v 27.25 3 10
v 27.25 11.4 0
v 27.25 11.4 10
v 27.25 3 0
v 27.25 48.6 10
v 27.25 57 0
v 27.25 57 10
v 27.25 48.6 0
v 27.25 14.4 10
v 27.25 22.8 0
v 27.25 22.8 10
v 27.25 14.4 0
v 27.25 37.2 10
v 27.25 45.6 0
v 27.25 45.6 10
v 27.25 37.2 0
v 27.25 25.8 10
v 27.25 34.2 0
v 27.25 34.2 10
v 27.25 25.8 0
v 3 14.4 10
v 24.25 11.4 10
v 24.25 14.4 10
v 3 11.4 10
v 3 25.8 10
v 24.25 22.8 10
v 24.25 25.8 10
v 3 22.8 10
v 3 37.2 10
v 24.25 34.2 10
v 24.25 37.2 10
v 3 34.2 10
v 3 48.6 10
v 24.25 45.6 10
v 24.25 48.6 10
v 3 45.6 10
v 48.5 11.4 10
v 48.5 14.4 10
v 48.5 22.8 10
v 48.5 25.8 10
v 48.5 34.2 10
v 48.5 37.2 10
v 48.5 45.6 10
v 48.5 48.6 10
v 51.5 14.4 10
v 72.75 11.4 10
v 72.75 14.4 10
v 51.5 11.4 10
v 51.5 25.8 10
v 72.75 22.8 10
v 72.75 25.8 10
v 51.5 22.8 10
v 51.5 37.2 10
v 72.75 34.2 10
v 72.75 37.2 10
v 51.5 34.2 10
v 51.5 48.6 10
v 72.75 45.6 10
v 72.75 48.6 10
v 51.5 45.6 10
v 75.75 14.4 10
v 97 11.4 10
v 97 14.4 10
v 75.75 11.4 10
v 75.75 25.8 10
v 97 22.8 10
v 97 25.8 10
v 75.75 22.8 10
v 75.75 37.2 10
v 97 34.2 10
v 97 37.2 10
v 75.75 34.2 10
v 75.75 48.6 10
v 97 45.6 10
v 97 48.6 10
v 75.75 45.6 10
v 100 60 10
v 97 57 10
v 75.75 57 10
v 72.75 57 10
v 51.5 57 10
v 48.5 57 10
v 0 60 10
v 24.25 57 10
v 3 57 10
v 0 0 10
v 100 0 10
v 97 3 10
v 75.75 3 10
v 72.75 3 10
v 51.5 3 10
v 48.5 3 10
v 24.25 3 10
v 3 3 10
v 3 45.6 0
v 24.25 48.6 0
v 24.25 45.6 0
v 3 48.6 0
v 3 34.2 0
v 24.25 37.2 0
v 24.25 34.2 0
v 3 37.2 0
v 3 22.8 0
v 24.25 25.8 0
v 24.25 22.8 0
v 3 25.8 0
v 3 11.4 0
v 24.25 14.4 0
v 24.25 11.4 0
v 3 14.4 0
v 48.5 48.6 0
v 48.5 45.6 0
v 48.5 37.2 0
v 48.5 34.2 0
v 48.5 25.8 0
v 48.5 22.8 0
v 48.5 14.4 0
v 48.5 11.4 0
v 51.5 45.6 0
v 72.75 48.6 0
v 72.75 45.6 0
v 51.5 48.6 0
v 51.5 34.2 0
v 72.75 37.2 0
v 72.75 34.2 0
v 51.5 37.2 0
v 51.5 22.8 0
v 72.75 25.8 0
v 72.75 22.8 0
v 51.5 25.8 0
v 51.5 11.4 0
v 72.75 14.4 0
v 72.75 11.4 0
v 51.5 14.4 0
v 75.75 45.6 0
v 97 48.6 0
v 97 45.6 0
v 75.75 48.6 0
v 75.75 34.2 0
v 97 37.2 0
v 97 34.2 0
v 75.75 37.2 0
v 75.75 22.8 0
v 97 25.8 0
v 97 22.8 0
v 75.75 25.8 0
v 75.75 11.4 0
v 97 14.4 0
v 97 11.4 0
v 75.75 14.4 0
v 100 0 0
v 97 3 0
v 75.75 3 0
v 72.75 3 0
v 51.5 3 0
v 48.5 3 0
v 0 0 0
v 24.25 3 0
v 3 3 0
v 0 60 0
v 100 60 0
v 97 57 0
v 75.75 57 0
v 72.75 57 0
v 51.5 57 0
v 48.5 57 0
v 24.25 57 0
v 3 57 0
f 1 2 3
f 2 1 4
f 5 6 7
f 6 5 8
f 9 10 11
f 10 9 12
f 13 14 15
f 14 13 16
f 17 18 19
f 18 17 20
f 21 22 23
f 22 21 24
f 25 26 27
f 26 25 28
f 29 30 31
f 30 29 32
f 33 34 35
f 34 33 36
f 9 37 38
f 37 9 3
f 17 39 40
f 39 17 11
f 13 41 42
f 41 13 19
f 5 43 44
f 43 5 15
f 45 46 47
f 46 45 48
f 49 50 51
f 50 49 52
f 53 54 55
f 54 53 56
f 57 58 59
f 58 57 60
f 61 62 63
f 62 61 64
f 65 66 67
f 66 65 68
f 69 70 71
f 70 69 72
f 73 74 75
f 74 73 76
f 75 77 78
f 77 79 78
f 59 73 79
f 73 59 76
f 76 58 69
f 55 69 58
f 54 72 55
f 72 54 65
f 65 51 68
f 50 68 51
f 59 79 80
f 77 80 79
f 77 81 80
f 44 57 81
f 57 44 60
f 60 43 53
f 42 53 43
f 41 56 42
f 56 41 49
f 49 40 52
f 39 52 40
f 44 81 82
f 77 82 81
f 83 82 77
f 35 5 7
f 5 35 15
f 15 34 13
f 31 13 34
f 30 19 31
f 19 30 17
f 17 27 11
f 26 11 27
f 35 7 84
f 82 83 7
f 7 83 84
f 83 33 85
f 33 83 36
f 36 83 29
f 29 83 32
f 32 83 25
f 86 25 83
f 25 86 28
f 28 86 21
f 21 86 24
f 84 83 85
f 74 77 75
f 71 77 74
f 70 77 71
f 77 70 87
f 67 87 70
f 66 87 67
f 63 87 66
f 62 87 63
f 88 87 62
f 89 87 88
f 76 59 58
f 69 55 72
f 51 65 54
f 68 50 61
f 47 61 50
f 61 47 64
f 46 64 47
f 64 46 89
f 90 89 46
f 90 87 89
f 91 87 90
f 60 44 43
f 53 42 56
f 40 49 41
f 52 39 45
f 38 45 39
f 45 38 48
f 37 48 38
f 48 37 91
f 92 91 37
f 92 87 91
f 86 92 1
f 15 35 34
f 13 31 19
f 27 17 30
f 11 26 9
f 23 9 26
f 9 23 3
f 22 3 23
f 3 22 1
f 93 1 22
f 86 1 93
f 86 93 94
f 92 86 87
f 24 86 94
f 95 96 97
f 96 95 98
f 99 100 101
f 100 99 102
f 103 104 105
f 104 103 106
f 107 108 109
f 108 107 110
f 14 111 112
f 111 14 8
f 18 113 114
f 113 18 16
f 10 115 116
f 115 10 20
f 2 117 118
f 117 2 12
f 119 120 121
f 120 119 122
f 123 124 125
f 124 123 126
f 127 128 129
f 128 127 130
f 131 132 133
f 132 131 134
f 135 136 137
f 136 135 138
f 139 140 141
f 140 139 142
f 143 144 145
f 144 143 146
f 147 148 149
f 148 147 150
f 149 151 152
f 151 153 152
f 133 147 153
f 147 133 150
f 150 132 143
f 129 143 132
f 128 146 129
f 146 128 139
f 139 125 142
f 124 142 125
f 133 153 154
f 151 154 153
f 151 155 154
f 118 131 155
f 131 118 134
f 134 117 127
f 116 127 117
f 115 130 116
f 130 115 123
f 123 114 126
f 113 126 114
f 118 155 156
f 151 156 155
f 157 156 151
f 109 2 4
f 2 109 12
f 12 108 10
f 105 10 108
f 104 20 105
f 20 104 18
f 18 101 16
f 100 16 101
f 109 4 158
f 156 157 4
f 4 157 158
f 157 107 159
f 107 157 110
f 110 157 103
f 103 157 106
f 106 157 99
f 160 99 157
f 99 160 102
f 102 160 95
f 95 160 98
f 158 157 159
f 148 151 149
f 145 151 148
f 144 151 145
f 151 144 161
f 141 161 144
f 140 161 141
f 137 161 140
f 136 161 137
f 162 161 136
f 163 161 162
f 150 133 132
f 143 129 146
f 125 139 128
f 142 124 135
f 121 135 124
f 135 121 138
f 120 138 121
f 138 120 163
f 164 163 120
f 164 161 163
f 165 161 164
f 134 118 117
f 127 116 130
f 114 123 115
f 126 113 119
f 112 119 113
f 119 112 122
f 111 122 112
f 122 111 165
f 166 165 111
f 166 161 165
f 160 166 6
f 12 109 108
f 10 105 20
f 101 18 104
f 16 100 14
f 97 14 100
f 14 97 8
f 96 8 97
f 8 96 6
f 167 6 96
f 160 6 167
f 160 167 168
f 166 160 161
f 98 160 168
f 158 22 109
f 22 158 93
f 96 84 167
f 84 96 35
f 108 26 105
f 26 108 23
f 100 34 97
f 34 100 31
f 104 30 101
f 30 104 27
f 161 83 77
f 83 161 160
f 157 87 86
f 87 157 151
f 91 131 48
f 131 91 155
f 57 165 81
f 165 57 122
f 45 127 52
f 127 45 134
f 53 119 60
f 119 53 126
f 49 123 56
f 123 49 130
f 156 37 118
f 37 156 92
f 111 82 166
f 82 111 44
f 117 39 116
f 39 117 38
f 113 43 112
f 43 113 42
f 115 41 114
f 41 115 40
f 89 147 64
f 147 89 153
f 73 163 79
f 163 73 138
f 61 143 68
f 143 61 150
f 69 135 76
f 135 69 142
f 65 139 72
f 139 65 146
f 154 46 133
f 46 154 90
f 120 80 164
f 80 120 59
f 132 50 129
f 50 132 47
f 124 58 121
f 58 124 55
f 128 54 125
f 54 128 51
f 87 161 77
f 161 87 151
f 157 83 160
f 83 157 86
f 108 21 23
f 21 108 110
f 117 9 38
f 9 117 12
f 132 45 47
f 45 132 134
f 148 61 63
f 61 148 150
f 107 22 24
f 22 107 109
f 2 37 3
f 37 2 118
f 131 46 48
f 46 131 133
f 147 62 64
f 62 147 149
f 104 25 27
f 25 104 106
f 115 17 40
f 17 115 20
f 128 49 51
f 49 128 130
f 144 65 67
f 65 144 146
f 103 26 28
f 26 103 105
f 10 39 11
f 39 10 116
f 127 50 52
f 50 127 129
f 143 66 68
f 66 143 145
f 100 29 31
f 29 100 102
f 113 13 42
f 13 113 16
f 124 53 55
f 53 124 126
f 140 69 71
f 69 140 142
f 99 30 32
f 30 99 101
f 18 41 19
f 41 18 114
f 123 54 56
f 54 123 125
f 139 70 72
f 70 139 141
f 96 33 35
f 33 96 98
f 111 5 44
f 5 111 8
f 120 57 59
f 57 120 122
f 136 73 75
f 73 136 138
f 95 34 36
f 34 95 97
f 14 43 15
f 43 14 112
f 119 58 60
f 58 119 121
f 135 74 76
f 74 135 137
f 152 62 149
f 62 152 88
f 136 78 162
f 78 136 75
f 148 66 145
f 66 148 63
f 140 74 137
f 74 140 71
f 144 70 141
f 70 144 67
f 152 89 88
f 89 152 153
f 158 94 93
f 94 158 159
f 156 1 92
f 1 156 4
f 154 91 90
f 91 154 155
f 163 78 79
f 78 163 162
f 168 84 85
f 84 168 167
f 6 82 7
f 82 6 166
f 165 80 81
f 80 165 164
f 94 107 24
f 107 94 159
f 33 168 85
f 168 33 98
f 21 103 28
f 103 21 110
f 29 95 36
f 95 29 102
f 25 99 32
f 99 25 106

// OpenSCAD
//(mm)
drawer_length = 100;
//(mm)
drawer_width = 60;
//(mm)
drawer_depth = 10;
//(mm)
material_width = 3;

number_of_horizontal_compartments = 4;
number_of_vertical_compartments = 5;

//translate([0,drawer_width/2-material_width/2,0]) cube([drawer_length, material_width, drawer_depth]);

cube([drawer_length-material_width, material_width, drawer_depth]);
translate([0,drawer_width-material_width, 0]) cube([drawer_length, material_width, drawer_depth]);
cube([material_width, drawer_width, drawer_depth]);
translate([drawer_length-material_width, 0, 0]) cube([material_width, drawer_width, drawer_depth]);


//translate([material_width*3+29.3*2,5,0]) cube([29.3,material_width, drawer_depth*1.1]);

module horizontal_lineup(num, space) {
   for (i = [0 : num-1])
     translate([space+space*i, 0, 0 ]) children();
     }

 color("red") {horizontal_lineup(number_of_horizontal_compartments-1, (drawer_length-material_width)/number_of_horizontal_compartments){ cube([material_width,drawer_width,drawer_depth]);}}

module vertical_lineup(num, space) {
   for (i = [0 : num-1])
     translate([0, space+space*i, 0 ]) children();
     }

 color("red") {vertical_lineup(number_of_vertical_compartments-1, (drawer_width-material_width)/number_of_vertical_compartments){ cube([drawer_length,material_width,drawer_depth]);}}

//echo("compartment width =", len(horizontal_lineup));

module compartment(){
    
    }
    
    /* Helpful documentation https://en.wikibooks.org/wiki/OpenSCAD_User_Manual/User-Defined_Functions_and_Modules#Children
    */
